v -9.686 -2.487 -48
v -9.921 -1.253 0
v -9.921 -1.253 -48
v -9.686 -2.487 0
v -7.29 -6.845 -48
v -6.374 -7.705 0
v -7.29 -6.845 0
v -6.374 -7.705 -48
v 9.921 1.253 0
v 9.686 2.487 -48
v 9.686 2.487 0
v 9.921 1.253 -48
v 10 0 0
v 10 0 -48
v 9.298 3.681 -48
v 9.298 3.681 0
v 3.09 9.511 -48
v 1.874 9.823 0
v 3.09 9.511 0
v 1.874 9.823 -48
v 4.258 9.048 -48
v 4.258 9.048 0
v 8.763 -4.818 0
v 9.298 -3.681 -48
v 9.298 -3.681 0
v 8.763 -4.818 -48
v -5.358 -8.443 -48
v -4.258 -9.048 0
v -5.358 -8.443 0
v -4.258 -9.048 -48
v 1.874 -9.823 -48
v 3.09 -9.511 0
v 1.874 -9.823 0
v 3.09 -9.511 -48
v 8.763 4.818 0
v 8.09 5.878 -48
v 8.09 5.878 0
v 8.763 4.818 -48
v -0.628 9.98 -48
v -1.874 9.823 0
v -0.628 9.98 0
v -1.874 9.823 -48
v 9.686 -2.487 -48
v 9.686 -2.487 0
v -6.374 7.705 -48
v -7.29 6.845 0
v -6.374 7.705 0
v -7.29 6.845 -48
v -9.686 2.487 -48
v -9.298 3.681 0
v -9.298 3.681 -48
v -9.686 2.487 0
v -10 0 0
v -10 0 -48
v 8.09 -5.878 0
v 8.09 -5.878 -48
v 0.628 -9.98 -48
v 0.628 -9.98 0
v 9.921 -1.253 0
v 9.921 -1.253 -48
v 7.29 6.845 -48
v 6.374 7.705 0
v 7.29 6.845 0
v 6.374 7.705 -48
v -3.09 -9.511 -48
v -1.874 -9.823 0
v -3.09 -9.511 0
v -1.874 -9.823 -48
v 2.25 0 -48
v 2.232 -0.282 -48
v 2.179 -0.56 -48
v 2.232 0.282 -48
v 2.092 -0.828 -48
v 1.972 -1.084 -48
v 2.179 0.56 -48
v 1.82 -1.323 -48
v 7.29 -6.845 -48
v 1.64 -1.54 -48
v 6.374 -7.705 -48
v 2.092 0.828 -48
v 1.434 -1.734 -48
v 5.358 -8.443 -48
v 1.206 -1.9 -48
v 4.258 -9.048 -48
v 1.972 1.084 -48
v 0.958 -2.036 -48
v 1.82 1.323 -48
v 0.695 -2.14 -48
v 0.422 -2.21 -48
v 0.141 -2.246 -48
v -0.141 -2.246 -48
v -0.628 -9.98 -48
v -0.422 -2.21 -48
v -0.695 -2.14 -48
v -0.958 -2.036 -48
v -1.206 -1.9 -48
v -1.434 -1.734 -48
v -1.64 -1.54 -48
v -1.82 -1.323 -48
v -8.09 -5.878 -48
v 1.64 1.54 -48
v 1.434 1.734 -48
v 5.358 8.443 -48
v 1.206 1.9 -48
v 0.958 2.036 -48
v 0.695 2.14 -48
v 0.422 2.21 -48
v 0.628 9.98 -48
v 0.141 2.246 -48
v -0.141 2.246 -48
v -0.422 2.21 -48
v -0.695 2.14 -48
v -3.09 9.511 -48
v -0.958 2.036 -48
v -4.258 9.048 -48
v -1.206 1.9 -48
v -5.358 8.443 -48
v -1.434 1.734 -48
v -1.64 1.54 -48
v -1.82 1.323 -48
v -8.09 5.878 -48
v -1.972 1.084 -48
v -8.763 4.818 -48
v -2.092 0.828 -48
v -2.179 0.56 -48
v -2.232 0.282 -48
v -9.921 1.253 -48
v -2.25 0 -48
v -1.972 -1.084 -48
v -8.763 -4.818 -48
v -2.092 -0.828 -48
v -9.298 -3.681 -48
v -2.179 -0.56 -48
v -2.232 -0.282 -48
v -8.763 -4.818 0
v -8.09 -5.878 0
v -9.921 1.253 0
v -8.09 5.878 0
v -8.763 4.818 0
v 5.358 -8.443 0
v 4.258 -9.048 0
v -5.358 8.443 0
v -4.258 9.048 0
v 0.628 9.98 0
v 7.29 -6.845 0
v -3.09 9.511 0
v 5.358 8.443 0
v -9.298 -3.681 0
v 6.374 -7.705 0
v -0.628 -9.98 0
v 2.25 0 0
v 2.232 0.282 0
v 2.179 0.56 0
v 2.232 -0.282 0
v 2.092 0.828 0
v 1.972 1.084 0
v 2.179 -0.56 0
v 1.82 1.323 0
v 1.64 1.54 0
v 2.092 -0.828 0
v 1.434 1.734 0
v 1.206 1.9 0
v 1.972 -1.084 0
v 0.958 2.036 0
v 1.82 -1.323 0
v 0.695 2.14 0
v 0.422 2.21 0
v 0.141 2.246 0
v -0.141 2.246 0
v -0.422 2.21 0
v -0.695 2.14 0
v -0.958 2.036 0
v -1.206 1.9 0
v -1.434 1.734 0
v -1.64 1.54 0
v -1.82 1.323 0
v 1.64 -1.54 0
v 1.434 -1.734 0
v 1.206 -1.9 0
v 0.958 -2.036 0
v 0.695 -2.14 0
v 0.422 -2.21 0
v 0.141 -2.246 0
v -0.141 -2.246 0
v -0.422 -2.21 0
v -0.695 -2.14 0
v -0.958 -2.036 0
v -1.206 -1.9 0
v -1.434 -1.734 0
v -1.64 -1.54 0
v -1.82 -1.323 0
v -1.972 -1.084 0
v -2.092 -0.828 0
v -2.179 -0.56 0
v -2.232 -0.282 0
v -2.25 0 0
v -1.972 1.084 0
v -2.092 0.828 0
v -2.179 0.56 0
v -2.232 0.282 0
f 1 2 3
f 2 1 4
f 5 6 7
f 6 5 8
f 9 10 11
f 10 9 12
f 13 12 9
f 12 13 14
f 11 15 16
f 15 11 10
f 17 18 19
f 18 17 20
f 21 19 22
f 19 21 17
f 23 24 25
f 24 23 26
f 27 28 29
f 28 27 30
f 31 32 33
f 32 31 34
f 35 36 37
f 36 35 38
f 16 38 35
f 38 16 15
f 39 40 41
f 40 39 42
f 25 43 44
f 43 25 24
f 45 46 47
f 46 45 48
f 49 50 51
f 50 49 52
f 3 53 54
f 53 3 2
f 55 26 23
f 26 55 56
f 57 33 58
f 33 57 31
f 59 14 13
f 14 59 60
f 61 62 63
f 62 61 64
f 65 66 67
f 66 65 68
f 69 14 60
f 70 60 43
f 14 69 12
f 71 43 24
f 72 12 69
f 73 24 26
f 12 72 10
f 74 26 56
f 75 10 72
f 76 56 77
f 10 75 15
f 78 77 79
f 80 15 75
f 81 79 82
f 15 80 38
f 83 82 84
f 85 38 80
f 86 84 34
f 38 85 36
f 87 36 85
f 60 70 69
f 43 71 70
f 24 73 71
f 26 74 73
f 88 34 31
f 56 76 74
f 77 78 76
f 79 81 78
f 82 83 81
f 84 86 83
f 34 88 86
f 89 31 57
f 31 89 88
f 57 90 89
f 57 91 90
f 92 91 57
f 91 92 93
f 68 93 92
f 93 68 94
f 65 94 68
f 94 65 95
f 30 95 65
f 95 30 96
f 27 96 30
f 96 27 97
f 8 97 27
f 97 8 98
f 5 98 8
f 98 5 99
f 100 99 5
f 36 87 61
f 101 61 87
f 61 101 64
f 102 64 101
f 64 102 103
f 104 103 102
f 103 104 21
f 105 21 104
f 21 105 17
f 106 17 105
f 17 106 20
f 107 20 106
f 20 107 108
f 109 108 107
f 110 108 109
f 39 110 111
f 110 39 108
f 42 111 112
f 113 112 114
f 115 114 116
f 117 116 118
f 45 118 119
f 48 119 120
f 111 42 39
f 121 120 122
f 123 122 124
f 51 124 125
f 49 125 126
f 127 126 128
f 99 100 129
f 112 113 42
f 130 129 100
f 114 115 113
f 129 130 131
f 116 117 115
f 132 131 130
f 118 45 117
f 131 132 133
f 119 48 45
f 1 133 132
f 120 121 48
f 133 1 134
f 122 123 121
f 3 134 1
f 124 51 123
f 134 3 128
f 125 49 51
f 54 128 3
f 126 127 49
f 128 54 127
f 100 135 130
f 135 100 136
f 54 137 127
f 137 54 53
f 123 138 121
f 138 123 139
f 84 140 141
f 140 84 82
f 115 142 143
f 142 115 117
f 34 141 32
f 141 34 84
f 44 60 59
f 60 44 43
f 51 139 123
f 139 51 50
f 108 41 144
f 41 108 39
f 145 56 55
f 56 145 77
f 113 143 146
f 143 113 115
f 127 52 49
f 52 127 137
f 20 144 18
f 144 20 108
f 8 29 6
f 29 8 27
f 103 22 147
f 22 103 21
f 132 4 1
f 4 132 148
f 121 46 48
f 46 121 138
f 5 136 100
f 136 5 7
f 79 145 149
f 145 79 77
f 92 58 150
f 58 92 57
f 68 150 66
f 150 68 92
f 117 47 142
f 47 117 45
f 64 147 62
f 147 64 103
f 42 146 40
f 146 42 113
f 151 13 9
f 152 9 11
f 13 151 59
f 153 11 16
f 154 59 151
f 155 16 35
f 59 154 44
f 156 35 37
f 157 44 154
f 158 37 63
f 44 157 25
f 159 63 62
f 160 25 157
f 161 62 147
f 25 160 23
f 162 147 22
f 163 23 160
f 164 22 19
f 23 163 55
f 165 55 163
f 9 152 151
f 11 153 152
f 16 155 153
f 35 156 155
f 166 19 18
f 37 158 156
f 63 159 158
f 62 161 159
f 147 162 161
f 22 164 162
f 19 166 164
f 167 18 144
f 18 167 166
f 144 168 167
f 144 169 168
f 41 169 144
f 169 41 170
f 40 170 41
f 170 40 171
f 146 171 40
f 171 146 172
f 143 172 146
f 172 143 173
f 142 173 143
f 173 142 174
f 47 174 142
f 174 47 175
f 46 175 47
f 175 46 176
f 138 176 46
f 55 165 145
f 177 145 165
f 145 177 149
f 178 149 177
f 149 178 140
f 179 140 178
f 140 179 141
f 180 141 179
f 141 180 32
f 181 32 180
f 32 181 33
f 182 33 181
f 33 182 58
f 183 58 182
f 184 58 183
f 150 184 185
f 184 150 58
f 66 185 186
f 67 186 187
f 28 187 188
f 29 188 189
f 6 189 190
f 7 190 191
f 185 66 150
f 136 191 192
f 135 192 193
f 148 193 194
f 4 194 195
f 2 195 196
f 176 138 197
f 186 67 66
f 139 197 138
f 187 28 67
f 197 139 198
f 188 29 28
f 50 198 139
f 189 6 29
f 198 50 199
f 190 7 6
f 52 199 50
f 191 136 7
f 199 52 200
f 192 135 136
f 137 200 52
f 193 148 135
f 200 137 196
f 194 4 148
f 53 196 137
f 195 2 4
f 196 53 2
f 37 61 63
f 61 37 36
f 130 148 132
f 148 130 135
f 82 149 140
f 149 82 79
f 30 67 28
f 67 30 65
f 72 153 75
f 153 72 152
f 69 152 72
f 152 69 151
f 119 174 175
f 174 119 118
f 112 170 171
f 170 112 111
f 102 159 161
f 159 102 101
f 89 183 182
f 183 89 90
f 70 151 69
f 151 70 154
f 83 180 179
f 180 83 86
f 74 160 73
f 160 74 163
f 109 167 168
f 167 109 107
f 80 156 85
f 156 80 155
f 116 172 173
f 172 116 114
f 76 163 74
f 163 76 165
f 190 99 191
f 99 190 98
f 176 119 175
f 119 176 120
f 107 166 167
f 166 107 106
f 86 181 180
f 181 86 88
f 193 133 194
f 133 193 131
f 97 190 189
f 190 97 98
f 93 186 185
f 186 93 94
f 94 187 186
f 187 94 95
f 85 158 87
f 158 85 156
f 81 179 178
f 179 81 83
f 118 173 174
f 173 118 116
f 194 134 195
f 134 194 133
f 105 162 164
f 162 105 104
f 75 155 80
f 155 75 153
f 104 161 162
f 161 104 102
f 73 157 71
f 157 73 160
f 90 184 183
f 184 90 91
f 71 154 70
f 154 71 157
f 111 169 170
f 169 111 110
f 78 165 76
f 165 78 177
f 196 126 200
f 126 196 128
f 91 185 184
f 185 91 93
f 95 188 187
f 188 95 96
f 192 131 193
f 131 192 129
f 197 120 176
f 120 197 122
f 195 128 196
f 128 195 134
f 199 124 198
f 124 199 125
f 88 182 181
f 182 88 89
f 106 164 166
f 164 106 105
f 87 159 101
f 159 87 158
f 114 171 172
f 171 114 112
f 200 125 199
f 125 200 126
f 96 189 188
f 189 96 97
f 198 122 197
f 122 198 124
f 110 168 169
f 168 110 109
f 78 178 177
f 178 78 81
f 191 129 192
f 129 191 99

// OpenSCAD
$fn = 50;


difference() {
	union() {
		translate(v = [0, 0, -48.0000000000]) {
			cylinder(h = 48, r = 10.0000000000);
		}
		cylinder(h = 0, r = 16.0000000000);
	}
	union() {
		#translate(v = [0, 0, -48]) {
			cylinder(h = 48, r = 2.2500000000);
		}
	}
}
